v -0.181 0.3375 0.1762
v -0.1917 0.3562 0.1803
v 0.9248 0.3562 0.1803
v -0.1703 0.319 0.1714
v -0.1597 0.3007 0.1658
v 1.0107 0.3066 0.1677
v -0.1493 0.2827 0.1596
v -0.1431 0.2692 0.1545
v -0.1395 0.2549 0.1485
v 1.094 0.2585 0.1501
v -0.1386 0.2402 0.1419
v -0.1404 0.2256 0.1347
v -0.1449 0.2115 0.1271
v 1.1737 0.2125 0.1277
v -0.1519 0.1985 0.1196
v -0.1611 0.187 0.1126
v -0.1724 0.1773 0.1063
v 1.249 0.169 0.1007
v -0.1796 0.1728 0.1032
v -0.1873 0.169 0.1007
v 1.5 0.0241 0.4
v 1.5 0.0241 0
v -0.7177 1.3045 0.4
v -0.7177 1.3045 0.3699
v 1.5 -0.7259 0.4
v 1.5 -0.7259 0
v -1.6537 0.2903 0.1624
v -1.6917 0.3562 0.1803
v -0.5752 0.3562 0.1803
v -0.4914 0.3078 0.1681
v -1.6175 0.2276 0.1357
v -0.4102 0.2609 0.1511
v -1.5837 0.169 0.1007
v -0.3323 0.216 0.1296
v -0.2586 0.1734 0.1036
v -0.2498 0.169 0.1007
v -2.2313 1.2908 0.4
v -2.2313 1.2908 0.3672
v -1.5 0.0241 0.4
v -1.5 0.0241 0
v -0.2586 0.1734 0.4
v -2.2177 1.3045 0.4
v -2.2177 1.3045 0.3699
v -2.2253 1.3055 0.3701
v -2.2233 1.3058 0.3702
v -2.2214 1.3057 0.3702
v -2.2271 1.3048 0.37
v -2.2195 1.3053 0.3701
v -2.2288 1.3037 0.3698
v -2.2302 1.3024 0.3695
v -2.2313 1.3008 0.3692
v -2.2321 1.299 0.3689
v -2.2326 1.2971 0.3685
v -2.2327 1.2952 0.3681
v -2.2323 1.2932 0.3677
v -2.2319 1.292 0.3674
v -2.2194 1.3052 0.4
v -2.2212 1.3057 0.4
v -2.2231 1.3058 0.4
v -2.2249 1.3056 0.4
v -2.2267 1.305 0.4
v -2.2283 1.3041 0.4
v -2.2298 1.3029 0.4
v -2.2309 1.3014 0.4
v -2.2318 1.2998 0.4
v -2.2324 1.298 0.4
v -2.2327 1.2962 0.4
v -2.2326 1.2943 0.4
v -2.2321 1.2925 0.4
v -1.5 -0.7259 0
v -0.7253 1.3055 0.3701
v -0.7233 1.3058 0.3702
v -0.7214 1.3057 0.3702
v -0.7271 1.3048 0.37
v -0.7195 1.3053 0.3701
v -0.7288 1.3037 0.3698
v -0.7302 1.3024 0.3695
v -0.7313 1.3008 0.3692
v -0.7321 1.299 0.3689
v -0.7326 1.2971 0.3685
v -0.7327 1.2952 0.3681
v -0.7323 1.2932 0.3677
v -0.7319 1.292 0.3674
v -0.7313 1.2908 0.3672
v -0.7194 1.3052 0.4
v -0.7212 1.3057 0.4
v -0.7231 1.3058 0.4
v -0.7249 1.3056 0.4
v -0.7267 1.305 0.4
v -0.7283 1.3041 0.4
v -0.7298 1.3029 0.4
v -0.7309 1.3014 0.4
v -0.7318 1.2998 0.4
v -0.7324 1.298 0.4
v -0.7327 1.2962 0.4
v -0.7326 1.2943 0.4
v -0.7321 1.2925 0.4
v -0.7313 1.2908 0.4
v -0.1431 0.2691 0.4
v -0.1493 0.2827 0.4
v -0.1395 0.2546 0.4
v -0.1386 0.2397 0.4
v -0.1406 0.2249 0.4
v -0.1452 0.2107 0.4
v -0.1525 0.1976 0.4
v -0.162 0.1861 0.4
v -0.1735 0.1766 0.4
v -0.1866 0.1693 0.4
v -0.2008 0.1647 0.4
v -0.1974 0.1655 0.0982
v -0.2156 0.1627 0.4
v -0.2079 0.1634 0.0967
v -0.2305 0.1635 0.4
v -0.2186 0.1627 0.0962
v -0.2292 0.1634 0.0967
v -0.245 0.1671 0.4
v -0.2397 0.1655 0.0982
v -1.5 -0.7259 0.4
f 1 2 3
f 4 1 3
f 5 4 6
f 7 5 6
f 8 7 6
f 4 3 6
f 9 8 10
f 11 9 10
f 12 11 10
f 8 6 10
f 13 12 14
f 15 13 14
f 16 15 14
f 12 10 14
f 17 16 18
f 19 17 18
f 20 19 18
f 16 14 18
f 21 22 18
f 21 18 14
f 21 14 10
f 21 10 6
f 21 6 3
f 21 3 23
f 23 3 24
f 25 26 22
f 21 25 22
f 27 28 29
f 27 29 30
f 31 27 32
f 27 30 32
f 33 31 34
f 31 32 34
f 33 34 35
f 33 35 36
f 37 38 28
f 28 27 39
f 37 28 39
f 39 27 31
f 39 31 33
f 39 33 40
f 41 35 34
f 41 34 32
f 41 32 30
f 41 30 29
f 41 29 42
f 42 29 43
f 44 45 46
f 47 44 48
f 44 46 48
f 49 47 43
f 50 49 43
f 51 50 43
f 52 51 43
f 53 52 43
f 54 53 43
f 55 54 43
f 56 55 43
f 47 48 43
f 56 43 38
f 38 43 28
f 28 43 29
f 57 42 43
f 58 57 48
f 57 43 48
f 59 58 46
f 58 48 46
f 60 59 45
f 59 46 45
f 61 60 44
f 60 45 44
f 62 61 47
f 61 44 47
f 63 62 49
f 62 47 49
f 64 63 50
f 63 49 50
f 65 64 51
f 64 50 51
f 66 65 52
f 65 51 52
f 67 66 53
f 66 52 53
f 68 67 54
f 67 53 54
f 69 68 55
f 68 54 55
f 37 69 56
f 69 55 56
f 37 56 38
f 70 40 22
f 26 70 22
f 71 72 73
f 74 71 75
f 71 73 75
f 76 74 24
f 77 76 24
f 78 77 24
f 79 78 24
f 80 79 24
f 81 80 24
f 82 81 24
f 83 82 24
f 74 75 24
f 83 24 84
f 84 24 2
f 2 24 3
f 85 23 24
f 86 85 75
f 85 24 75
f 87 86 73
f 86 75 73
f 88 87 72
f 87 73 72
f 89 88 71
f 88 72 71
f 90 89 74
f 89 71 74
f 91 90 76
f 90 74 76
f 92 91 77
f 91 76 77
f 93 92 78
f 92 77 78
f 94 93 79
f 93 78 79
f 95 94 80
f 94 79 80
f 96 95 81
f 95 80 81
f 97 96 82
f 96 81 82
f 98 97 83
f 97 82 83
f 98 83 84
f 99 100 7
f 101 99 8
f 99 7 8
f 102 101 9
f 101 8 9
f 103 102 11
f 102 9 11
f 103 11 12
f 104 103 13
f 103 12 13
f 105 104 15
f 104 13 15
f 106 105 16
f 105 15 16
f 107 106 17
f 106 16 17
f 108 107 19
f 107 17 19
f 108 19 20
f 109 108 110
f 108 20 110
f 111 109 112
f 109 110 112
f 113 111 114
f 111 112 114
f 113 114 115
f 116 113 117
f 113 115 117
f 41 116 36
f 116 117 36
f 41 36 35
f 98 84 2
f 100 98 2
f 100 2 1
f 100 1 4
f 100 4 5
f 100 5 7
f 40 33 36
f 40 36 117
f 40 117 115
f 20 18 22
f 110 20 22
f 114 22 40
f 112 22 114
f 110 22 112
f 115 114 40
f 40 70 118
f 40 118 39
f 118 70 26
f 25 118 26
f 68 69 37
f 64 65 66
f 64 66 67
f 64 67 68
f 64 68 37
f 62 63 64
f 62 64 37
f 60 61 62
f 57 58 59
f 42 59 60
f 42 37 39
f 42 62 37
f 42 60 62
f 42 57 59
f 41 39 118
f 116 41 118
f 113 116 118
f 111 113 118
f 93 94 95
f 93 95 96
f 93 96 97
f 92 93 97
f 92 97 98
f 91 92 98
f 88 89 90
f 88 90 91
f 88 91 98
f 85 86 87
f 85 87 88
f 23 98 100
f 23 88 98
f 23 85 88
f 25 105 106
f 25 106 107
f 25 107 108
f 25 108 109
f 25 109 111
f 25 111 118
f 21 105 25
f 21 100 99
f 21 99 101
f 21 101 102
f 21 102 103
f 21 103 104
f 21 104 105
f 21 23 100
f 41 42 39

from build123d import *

# Parameters (mm, degrees)
SKETCH1_W           = 3
SKETCH1_H           = 0.75
BOSS_EXTRUDE2_DEPTH = 0.4
CUT_EXTRUDE2_DEPTH  = 7.4


with BuildPart() as part:
    # Sketch1 → Boss-Extrude2 (new body)
    with BuildSketch(Plane.XY):
        with Locations((0, -0.350910333)):
            Rectangle(SKETCH1_W, SKETCH1_H)
        with BuildLine():
            Line((1.5, 0.024089667), (-0.717679492, 1.304467518))
            ThreePointArc((-0.717679492, 1.304467518), (-0.72975056, 1.302878332), (-0.731339746, 1.290807264))
            Line((-0.731339746, 1.290807264), (-0.149282032, 0.282653731))
            ThreePointArc((-0.149282032, 0.282653731), (-0.161995522, 0.186085189), (-0.258564065, 0.173371699))
            Line((-0.258564065, 0.173371699), (-2.217679492, 1.304467518))
            ThreePointArc((-2.217679492, 1.304467518), (-2.22975056, 1.302878332), (-2.231339746, 1.290807264))
            Line((-2.231339746, 1.290807264), (-1.5, 0.024089667))
            Line((-1.5, 0.024089667), (1.5, 0.024089667))
        make_face()
    extrude(amount=BOSS_EXTRUDE2_DEPTH)

    # Sketch3 → Cut-Extrude2 (cut)
    with BuildSketch(Plane(origin=(1.5, 0, 0), x_dir=(0, 0, -1), z_dir=(1, 0, 0))):
        with BuildLine():
            Line((-0.395475089, 1.432117688), (-0.180277111, 0.356172496))
            ThreePointArc((-0.180277111, 0.356172496), (-0.150082623, 0.258498611), (-0.100652673, 0.16900797))
            Line((-0.100652673, 0.16900797), (0, 0.024089667))
            Line((0, 0.024089667), (0, 1.432117688))
            Line((0, 1.432117688), (-0.395475089, 1.432117688))
        make_face()
    extrude(amount=-CUT_EXTRUDE2_DEPTH, mode=Mode.SUBTRACT)


solid = part.part
